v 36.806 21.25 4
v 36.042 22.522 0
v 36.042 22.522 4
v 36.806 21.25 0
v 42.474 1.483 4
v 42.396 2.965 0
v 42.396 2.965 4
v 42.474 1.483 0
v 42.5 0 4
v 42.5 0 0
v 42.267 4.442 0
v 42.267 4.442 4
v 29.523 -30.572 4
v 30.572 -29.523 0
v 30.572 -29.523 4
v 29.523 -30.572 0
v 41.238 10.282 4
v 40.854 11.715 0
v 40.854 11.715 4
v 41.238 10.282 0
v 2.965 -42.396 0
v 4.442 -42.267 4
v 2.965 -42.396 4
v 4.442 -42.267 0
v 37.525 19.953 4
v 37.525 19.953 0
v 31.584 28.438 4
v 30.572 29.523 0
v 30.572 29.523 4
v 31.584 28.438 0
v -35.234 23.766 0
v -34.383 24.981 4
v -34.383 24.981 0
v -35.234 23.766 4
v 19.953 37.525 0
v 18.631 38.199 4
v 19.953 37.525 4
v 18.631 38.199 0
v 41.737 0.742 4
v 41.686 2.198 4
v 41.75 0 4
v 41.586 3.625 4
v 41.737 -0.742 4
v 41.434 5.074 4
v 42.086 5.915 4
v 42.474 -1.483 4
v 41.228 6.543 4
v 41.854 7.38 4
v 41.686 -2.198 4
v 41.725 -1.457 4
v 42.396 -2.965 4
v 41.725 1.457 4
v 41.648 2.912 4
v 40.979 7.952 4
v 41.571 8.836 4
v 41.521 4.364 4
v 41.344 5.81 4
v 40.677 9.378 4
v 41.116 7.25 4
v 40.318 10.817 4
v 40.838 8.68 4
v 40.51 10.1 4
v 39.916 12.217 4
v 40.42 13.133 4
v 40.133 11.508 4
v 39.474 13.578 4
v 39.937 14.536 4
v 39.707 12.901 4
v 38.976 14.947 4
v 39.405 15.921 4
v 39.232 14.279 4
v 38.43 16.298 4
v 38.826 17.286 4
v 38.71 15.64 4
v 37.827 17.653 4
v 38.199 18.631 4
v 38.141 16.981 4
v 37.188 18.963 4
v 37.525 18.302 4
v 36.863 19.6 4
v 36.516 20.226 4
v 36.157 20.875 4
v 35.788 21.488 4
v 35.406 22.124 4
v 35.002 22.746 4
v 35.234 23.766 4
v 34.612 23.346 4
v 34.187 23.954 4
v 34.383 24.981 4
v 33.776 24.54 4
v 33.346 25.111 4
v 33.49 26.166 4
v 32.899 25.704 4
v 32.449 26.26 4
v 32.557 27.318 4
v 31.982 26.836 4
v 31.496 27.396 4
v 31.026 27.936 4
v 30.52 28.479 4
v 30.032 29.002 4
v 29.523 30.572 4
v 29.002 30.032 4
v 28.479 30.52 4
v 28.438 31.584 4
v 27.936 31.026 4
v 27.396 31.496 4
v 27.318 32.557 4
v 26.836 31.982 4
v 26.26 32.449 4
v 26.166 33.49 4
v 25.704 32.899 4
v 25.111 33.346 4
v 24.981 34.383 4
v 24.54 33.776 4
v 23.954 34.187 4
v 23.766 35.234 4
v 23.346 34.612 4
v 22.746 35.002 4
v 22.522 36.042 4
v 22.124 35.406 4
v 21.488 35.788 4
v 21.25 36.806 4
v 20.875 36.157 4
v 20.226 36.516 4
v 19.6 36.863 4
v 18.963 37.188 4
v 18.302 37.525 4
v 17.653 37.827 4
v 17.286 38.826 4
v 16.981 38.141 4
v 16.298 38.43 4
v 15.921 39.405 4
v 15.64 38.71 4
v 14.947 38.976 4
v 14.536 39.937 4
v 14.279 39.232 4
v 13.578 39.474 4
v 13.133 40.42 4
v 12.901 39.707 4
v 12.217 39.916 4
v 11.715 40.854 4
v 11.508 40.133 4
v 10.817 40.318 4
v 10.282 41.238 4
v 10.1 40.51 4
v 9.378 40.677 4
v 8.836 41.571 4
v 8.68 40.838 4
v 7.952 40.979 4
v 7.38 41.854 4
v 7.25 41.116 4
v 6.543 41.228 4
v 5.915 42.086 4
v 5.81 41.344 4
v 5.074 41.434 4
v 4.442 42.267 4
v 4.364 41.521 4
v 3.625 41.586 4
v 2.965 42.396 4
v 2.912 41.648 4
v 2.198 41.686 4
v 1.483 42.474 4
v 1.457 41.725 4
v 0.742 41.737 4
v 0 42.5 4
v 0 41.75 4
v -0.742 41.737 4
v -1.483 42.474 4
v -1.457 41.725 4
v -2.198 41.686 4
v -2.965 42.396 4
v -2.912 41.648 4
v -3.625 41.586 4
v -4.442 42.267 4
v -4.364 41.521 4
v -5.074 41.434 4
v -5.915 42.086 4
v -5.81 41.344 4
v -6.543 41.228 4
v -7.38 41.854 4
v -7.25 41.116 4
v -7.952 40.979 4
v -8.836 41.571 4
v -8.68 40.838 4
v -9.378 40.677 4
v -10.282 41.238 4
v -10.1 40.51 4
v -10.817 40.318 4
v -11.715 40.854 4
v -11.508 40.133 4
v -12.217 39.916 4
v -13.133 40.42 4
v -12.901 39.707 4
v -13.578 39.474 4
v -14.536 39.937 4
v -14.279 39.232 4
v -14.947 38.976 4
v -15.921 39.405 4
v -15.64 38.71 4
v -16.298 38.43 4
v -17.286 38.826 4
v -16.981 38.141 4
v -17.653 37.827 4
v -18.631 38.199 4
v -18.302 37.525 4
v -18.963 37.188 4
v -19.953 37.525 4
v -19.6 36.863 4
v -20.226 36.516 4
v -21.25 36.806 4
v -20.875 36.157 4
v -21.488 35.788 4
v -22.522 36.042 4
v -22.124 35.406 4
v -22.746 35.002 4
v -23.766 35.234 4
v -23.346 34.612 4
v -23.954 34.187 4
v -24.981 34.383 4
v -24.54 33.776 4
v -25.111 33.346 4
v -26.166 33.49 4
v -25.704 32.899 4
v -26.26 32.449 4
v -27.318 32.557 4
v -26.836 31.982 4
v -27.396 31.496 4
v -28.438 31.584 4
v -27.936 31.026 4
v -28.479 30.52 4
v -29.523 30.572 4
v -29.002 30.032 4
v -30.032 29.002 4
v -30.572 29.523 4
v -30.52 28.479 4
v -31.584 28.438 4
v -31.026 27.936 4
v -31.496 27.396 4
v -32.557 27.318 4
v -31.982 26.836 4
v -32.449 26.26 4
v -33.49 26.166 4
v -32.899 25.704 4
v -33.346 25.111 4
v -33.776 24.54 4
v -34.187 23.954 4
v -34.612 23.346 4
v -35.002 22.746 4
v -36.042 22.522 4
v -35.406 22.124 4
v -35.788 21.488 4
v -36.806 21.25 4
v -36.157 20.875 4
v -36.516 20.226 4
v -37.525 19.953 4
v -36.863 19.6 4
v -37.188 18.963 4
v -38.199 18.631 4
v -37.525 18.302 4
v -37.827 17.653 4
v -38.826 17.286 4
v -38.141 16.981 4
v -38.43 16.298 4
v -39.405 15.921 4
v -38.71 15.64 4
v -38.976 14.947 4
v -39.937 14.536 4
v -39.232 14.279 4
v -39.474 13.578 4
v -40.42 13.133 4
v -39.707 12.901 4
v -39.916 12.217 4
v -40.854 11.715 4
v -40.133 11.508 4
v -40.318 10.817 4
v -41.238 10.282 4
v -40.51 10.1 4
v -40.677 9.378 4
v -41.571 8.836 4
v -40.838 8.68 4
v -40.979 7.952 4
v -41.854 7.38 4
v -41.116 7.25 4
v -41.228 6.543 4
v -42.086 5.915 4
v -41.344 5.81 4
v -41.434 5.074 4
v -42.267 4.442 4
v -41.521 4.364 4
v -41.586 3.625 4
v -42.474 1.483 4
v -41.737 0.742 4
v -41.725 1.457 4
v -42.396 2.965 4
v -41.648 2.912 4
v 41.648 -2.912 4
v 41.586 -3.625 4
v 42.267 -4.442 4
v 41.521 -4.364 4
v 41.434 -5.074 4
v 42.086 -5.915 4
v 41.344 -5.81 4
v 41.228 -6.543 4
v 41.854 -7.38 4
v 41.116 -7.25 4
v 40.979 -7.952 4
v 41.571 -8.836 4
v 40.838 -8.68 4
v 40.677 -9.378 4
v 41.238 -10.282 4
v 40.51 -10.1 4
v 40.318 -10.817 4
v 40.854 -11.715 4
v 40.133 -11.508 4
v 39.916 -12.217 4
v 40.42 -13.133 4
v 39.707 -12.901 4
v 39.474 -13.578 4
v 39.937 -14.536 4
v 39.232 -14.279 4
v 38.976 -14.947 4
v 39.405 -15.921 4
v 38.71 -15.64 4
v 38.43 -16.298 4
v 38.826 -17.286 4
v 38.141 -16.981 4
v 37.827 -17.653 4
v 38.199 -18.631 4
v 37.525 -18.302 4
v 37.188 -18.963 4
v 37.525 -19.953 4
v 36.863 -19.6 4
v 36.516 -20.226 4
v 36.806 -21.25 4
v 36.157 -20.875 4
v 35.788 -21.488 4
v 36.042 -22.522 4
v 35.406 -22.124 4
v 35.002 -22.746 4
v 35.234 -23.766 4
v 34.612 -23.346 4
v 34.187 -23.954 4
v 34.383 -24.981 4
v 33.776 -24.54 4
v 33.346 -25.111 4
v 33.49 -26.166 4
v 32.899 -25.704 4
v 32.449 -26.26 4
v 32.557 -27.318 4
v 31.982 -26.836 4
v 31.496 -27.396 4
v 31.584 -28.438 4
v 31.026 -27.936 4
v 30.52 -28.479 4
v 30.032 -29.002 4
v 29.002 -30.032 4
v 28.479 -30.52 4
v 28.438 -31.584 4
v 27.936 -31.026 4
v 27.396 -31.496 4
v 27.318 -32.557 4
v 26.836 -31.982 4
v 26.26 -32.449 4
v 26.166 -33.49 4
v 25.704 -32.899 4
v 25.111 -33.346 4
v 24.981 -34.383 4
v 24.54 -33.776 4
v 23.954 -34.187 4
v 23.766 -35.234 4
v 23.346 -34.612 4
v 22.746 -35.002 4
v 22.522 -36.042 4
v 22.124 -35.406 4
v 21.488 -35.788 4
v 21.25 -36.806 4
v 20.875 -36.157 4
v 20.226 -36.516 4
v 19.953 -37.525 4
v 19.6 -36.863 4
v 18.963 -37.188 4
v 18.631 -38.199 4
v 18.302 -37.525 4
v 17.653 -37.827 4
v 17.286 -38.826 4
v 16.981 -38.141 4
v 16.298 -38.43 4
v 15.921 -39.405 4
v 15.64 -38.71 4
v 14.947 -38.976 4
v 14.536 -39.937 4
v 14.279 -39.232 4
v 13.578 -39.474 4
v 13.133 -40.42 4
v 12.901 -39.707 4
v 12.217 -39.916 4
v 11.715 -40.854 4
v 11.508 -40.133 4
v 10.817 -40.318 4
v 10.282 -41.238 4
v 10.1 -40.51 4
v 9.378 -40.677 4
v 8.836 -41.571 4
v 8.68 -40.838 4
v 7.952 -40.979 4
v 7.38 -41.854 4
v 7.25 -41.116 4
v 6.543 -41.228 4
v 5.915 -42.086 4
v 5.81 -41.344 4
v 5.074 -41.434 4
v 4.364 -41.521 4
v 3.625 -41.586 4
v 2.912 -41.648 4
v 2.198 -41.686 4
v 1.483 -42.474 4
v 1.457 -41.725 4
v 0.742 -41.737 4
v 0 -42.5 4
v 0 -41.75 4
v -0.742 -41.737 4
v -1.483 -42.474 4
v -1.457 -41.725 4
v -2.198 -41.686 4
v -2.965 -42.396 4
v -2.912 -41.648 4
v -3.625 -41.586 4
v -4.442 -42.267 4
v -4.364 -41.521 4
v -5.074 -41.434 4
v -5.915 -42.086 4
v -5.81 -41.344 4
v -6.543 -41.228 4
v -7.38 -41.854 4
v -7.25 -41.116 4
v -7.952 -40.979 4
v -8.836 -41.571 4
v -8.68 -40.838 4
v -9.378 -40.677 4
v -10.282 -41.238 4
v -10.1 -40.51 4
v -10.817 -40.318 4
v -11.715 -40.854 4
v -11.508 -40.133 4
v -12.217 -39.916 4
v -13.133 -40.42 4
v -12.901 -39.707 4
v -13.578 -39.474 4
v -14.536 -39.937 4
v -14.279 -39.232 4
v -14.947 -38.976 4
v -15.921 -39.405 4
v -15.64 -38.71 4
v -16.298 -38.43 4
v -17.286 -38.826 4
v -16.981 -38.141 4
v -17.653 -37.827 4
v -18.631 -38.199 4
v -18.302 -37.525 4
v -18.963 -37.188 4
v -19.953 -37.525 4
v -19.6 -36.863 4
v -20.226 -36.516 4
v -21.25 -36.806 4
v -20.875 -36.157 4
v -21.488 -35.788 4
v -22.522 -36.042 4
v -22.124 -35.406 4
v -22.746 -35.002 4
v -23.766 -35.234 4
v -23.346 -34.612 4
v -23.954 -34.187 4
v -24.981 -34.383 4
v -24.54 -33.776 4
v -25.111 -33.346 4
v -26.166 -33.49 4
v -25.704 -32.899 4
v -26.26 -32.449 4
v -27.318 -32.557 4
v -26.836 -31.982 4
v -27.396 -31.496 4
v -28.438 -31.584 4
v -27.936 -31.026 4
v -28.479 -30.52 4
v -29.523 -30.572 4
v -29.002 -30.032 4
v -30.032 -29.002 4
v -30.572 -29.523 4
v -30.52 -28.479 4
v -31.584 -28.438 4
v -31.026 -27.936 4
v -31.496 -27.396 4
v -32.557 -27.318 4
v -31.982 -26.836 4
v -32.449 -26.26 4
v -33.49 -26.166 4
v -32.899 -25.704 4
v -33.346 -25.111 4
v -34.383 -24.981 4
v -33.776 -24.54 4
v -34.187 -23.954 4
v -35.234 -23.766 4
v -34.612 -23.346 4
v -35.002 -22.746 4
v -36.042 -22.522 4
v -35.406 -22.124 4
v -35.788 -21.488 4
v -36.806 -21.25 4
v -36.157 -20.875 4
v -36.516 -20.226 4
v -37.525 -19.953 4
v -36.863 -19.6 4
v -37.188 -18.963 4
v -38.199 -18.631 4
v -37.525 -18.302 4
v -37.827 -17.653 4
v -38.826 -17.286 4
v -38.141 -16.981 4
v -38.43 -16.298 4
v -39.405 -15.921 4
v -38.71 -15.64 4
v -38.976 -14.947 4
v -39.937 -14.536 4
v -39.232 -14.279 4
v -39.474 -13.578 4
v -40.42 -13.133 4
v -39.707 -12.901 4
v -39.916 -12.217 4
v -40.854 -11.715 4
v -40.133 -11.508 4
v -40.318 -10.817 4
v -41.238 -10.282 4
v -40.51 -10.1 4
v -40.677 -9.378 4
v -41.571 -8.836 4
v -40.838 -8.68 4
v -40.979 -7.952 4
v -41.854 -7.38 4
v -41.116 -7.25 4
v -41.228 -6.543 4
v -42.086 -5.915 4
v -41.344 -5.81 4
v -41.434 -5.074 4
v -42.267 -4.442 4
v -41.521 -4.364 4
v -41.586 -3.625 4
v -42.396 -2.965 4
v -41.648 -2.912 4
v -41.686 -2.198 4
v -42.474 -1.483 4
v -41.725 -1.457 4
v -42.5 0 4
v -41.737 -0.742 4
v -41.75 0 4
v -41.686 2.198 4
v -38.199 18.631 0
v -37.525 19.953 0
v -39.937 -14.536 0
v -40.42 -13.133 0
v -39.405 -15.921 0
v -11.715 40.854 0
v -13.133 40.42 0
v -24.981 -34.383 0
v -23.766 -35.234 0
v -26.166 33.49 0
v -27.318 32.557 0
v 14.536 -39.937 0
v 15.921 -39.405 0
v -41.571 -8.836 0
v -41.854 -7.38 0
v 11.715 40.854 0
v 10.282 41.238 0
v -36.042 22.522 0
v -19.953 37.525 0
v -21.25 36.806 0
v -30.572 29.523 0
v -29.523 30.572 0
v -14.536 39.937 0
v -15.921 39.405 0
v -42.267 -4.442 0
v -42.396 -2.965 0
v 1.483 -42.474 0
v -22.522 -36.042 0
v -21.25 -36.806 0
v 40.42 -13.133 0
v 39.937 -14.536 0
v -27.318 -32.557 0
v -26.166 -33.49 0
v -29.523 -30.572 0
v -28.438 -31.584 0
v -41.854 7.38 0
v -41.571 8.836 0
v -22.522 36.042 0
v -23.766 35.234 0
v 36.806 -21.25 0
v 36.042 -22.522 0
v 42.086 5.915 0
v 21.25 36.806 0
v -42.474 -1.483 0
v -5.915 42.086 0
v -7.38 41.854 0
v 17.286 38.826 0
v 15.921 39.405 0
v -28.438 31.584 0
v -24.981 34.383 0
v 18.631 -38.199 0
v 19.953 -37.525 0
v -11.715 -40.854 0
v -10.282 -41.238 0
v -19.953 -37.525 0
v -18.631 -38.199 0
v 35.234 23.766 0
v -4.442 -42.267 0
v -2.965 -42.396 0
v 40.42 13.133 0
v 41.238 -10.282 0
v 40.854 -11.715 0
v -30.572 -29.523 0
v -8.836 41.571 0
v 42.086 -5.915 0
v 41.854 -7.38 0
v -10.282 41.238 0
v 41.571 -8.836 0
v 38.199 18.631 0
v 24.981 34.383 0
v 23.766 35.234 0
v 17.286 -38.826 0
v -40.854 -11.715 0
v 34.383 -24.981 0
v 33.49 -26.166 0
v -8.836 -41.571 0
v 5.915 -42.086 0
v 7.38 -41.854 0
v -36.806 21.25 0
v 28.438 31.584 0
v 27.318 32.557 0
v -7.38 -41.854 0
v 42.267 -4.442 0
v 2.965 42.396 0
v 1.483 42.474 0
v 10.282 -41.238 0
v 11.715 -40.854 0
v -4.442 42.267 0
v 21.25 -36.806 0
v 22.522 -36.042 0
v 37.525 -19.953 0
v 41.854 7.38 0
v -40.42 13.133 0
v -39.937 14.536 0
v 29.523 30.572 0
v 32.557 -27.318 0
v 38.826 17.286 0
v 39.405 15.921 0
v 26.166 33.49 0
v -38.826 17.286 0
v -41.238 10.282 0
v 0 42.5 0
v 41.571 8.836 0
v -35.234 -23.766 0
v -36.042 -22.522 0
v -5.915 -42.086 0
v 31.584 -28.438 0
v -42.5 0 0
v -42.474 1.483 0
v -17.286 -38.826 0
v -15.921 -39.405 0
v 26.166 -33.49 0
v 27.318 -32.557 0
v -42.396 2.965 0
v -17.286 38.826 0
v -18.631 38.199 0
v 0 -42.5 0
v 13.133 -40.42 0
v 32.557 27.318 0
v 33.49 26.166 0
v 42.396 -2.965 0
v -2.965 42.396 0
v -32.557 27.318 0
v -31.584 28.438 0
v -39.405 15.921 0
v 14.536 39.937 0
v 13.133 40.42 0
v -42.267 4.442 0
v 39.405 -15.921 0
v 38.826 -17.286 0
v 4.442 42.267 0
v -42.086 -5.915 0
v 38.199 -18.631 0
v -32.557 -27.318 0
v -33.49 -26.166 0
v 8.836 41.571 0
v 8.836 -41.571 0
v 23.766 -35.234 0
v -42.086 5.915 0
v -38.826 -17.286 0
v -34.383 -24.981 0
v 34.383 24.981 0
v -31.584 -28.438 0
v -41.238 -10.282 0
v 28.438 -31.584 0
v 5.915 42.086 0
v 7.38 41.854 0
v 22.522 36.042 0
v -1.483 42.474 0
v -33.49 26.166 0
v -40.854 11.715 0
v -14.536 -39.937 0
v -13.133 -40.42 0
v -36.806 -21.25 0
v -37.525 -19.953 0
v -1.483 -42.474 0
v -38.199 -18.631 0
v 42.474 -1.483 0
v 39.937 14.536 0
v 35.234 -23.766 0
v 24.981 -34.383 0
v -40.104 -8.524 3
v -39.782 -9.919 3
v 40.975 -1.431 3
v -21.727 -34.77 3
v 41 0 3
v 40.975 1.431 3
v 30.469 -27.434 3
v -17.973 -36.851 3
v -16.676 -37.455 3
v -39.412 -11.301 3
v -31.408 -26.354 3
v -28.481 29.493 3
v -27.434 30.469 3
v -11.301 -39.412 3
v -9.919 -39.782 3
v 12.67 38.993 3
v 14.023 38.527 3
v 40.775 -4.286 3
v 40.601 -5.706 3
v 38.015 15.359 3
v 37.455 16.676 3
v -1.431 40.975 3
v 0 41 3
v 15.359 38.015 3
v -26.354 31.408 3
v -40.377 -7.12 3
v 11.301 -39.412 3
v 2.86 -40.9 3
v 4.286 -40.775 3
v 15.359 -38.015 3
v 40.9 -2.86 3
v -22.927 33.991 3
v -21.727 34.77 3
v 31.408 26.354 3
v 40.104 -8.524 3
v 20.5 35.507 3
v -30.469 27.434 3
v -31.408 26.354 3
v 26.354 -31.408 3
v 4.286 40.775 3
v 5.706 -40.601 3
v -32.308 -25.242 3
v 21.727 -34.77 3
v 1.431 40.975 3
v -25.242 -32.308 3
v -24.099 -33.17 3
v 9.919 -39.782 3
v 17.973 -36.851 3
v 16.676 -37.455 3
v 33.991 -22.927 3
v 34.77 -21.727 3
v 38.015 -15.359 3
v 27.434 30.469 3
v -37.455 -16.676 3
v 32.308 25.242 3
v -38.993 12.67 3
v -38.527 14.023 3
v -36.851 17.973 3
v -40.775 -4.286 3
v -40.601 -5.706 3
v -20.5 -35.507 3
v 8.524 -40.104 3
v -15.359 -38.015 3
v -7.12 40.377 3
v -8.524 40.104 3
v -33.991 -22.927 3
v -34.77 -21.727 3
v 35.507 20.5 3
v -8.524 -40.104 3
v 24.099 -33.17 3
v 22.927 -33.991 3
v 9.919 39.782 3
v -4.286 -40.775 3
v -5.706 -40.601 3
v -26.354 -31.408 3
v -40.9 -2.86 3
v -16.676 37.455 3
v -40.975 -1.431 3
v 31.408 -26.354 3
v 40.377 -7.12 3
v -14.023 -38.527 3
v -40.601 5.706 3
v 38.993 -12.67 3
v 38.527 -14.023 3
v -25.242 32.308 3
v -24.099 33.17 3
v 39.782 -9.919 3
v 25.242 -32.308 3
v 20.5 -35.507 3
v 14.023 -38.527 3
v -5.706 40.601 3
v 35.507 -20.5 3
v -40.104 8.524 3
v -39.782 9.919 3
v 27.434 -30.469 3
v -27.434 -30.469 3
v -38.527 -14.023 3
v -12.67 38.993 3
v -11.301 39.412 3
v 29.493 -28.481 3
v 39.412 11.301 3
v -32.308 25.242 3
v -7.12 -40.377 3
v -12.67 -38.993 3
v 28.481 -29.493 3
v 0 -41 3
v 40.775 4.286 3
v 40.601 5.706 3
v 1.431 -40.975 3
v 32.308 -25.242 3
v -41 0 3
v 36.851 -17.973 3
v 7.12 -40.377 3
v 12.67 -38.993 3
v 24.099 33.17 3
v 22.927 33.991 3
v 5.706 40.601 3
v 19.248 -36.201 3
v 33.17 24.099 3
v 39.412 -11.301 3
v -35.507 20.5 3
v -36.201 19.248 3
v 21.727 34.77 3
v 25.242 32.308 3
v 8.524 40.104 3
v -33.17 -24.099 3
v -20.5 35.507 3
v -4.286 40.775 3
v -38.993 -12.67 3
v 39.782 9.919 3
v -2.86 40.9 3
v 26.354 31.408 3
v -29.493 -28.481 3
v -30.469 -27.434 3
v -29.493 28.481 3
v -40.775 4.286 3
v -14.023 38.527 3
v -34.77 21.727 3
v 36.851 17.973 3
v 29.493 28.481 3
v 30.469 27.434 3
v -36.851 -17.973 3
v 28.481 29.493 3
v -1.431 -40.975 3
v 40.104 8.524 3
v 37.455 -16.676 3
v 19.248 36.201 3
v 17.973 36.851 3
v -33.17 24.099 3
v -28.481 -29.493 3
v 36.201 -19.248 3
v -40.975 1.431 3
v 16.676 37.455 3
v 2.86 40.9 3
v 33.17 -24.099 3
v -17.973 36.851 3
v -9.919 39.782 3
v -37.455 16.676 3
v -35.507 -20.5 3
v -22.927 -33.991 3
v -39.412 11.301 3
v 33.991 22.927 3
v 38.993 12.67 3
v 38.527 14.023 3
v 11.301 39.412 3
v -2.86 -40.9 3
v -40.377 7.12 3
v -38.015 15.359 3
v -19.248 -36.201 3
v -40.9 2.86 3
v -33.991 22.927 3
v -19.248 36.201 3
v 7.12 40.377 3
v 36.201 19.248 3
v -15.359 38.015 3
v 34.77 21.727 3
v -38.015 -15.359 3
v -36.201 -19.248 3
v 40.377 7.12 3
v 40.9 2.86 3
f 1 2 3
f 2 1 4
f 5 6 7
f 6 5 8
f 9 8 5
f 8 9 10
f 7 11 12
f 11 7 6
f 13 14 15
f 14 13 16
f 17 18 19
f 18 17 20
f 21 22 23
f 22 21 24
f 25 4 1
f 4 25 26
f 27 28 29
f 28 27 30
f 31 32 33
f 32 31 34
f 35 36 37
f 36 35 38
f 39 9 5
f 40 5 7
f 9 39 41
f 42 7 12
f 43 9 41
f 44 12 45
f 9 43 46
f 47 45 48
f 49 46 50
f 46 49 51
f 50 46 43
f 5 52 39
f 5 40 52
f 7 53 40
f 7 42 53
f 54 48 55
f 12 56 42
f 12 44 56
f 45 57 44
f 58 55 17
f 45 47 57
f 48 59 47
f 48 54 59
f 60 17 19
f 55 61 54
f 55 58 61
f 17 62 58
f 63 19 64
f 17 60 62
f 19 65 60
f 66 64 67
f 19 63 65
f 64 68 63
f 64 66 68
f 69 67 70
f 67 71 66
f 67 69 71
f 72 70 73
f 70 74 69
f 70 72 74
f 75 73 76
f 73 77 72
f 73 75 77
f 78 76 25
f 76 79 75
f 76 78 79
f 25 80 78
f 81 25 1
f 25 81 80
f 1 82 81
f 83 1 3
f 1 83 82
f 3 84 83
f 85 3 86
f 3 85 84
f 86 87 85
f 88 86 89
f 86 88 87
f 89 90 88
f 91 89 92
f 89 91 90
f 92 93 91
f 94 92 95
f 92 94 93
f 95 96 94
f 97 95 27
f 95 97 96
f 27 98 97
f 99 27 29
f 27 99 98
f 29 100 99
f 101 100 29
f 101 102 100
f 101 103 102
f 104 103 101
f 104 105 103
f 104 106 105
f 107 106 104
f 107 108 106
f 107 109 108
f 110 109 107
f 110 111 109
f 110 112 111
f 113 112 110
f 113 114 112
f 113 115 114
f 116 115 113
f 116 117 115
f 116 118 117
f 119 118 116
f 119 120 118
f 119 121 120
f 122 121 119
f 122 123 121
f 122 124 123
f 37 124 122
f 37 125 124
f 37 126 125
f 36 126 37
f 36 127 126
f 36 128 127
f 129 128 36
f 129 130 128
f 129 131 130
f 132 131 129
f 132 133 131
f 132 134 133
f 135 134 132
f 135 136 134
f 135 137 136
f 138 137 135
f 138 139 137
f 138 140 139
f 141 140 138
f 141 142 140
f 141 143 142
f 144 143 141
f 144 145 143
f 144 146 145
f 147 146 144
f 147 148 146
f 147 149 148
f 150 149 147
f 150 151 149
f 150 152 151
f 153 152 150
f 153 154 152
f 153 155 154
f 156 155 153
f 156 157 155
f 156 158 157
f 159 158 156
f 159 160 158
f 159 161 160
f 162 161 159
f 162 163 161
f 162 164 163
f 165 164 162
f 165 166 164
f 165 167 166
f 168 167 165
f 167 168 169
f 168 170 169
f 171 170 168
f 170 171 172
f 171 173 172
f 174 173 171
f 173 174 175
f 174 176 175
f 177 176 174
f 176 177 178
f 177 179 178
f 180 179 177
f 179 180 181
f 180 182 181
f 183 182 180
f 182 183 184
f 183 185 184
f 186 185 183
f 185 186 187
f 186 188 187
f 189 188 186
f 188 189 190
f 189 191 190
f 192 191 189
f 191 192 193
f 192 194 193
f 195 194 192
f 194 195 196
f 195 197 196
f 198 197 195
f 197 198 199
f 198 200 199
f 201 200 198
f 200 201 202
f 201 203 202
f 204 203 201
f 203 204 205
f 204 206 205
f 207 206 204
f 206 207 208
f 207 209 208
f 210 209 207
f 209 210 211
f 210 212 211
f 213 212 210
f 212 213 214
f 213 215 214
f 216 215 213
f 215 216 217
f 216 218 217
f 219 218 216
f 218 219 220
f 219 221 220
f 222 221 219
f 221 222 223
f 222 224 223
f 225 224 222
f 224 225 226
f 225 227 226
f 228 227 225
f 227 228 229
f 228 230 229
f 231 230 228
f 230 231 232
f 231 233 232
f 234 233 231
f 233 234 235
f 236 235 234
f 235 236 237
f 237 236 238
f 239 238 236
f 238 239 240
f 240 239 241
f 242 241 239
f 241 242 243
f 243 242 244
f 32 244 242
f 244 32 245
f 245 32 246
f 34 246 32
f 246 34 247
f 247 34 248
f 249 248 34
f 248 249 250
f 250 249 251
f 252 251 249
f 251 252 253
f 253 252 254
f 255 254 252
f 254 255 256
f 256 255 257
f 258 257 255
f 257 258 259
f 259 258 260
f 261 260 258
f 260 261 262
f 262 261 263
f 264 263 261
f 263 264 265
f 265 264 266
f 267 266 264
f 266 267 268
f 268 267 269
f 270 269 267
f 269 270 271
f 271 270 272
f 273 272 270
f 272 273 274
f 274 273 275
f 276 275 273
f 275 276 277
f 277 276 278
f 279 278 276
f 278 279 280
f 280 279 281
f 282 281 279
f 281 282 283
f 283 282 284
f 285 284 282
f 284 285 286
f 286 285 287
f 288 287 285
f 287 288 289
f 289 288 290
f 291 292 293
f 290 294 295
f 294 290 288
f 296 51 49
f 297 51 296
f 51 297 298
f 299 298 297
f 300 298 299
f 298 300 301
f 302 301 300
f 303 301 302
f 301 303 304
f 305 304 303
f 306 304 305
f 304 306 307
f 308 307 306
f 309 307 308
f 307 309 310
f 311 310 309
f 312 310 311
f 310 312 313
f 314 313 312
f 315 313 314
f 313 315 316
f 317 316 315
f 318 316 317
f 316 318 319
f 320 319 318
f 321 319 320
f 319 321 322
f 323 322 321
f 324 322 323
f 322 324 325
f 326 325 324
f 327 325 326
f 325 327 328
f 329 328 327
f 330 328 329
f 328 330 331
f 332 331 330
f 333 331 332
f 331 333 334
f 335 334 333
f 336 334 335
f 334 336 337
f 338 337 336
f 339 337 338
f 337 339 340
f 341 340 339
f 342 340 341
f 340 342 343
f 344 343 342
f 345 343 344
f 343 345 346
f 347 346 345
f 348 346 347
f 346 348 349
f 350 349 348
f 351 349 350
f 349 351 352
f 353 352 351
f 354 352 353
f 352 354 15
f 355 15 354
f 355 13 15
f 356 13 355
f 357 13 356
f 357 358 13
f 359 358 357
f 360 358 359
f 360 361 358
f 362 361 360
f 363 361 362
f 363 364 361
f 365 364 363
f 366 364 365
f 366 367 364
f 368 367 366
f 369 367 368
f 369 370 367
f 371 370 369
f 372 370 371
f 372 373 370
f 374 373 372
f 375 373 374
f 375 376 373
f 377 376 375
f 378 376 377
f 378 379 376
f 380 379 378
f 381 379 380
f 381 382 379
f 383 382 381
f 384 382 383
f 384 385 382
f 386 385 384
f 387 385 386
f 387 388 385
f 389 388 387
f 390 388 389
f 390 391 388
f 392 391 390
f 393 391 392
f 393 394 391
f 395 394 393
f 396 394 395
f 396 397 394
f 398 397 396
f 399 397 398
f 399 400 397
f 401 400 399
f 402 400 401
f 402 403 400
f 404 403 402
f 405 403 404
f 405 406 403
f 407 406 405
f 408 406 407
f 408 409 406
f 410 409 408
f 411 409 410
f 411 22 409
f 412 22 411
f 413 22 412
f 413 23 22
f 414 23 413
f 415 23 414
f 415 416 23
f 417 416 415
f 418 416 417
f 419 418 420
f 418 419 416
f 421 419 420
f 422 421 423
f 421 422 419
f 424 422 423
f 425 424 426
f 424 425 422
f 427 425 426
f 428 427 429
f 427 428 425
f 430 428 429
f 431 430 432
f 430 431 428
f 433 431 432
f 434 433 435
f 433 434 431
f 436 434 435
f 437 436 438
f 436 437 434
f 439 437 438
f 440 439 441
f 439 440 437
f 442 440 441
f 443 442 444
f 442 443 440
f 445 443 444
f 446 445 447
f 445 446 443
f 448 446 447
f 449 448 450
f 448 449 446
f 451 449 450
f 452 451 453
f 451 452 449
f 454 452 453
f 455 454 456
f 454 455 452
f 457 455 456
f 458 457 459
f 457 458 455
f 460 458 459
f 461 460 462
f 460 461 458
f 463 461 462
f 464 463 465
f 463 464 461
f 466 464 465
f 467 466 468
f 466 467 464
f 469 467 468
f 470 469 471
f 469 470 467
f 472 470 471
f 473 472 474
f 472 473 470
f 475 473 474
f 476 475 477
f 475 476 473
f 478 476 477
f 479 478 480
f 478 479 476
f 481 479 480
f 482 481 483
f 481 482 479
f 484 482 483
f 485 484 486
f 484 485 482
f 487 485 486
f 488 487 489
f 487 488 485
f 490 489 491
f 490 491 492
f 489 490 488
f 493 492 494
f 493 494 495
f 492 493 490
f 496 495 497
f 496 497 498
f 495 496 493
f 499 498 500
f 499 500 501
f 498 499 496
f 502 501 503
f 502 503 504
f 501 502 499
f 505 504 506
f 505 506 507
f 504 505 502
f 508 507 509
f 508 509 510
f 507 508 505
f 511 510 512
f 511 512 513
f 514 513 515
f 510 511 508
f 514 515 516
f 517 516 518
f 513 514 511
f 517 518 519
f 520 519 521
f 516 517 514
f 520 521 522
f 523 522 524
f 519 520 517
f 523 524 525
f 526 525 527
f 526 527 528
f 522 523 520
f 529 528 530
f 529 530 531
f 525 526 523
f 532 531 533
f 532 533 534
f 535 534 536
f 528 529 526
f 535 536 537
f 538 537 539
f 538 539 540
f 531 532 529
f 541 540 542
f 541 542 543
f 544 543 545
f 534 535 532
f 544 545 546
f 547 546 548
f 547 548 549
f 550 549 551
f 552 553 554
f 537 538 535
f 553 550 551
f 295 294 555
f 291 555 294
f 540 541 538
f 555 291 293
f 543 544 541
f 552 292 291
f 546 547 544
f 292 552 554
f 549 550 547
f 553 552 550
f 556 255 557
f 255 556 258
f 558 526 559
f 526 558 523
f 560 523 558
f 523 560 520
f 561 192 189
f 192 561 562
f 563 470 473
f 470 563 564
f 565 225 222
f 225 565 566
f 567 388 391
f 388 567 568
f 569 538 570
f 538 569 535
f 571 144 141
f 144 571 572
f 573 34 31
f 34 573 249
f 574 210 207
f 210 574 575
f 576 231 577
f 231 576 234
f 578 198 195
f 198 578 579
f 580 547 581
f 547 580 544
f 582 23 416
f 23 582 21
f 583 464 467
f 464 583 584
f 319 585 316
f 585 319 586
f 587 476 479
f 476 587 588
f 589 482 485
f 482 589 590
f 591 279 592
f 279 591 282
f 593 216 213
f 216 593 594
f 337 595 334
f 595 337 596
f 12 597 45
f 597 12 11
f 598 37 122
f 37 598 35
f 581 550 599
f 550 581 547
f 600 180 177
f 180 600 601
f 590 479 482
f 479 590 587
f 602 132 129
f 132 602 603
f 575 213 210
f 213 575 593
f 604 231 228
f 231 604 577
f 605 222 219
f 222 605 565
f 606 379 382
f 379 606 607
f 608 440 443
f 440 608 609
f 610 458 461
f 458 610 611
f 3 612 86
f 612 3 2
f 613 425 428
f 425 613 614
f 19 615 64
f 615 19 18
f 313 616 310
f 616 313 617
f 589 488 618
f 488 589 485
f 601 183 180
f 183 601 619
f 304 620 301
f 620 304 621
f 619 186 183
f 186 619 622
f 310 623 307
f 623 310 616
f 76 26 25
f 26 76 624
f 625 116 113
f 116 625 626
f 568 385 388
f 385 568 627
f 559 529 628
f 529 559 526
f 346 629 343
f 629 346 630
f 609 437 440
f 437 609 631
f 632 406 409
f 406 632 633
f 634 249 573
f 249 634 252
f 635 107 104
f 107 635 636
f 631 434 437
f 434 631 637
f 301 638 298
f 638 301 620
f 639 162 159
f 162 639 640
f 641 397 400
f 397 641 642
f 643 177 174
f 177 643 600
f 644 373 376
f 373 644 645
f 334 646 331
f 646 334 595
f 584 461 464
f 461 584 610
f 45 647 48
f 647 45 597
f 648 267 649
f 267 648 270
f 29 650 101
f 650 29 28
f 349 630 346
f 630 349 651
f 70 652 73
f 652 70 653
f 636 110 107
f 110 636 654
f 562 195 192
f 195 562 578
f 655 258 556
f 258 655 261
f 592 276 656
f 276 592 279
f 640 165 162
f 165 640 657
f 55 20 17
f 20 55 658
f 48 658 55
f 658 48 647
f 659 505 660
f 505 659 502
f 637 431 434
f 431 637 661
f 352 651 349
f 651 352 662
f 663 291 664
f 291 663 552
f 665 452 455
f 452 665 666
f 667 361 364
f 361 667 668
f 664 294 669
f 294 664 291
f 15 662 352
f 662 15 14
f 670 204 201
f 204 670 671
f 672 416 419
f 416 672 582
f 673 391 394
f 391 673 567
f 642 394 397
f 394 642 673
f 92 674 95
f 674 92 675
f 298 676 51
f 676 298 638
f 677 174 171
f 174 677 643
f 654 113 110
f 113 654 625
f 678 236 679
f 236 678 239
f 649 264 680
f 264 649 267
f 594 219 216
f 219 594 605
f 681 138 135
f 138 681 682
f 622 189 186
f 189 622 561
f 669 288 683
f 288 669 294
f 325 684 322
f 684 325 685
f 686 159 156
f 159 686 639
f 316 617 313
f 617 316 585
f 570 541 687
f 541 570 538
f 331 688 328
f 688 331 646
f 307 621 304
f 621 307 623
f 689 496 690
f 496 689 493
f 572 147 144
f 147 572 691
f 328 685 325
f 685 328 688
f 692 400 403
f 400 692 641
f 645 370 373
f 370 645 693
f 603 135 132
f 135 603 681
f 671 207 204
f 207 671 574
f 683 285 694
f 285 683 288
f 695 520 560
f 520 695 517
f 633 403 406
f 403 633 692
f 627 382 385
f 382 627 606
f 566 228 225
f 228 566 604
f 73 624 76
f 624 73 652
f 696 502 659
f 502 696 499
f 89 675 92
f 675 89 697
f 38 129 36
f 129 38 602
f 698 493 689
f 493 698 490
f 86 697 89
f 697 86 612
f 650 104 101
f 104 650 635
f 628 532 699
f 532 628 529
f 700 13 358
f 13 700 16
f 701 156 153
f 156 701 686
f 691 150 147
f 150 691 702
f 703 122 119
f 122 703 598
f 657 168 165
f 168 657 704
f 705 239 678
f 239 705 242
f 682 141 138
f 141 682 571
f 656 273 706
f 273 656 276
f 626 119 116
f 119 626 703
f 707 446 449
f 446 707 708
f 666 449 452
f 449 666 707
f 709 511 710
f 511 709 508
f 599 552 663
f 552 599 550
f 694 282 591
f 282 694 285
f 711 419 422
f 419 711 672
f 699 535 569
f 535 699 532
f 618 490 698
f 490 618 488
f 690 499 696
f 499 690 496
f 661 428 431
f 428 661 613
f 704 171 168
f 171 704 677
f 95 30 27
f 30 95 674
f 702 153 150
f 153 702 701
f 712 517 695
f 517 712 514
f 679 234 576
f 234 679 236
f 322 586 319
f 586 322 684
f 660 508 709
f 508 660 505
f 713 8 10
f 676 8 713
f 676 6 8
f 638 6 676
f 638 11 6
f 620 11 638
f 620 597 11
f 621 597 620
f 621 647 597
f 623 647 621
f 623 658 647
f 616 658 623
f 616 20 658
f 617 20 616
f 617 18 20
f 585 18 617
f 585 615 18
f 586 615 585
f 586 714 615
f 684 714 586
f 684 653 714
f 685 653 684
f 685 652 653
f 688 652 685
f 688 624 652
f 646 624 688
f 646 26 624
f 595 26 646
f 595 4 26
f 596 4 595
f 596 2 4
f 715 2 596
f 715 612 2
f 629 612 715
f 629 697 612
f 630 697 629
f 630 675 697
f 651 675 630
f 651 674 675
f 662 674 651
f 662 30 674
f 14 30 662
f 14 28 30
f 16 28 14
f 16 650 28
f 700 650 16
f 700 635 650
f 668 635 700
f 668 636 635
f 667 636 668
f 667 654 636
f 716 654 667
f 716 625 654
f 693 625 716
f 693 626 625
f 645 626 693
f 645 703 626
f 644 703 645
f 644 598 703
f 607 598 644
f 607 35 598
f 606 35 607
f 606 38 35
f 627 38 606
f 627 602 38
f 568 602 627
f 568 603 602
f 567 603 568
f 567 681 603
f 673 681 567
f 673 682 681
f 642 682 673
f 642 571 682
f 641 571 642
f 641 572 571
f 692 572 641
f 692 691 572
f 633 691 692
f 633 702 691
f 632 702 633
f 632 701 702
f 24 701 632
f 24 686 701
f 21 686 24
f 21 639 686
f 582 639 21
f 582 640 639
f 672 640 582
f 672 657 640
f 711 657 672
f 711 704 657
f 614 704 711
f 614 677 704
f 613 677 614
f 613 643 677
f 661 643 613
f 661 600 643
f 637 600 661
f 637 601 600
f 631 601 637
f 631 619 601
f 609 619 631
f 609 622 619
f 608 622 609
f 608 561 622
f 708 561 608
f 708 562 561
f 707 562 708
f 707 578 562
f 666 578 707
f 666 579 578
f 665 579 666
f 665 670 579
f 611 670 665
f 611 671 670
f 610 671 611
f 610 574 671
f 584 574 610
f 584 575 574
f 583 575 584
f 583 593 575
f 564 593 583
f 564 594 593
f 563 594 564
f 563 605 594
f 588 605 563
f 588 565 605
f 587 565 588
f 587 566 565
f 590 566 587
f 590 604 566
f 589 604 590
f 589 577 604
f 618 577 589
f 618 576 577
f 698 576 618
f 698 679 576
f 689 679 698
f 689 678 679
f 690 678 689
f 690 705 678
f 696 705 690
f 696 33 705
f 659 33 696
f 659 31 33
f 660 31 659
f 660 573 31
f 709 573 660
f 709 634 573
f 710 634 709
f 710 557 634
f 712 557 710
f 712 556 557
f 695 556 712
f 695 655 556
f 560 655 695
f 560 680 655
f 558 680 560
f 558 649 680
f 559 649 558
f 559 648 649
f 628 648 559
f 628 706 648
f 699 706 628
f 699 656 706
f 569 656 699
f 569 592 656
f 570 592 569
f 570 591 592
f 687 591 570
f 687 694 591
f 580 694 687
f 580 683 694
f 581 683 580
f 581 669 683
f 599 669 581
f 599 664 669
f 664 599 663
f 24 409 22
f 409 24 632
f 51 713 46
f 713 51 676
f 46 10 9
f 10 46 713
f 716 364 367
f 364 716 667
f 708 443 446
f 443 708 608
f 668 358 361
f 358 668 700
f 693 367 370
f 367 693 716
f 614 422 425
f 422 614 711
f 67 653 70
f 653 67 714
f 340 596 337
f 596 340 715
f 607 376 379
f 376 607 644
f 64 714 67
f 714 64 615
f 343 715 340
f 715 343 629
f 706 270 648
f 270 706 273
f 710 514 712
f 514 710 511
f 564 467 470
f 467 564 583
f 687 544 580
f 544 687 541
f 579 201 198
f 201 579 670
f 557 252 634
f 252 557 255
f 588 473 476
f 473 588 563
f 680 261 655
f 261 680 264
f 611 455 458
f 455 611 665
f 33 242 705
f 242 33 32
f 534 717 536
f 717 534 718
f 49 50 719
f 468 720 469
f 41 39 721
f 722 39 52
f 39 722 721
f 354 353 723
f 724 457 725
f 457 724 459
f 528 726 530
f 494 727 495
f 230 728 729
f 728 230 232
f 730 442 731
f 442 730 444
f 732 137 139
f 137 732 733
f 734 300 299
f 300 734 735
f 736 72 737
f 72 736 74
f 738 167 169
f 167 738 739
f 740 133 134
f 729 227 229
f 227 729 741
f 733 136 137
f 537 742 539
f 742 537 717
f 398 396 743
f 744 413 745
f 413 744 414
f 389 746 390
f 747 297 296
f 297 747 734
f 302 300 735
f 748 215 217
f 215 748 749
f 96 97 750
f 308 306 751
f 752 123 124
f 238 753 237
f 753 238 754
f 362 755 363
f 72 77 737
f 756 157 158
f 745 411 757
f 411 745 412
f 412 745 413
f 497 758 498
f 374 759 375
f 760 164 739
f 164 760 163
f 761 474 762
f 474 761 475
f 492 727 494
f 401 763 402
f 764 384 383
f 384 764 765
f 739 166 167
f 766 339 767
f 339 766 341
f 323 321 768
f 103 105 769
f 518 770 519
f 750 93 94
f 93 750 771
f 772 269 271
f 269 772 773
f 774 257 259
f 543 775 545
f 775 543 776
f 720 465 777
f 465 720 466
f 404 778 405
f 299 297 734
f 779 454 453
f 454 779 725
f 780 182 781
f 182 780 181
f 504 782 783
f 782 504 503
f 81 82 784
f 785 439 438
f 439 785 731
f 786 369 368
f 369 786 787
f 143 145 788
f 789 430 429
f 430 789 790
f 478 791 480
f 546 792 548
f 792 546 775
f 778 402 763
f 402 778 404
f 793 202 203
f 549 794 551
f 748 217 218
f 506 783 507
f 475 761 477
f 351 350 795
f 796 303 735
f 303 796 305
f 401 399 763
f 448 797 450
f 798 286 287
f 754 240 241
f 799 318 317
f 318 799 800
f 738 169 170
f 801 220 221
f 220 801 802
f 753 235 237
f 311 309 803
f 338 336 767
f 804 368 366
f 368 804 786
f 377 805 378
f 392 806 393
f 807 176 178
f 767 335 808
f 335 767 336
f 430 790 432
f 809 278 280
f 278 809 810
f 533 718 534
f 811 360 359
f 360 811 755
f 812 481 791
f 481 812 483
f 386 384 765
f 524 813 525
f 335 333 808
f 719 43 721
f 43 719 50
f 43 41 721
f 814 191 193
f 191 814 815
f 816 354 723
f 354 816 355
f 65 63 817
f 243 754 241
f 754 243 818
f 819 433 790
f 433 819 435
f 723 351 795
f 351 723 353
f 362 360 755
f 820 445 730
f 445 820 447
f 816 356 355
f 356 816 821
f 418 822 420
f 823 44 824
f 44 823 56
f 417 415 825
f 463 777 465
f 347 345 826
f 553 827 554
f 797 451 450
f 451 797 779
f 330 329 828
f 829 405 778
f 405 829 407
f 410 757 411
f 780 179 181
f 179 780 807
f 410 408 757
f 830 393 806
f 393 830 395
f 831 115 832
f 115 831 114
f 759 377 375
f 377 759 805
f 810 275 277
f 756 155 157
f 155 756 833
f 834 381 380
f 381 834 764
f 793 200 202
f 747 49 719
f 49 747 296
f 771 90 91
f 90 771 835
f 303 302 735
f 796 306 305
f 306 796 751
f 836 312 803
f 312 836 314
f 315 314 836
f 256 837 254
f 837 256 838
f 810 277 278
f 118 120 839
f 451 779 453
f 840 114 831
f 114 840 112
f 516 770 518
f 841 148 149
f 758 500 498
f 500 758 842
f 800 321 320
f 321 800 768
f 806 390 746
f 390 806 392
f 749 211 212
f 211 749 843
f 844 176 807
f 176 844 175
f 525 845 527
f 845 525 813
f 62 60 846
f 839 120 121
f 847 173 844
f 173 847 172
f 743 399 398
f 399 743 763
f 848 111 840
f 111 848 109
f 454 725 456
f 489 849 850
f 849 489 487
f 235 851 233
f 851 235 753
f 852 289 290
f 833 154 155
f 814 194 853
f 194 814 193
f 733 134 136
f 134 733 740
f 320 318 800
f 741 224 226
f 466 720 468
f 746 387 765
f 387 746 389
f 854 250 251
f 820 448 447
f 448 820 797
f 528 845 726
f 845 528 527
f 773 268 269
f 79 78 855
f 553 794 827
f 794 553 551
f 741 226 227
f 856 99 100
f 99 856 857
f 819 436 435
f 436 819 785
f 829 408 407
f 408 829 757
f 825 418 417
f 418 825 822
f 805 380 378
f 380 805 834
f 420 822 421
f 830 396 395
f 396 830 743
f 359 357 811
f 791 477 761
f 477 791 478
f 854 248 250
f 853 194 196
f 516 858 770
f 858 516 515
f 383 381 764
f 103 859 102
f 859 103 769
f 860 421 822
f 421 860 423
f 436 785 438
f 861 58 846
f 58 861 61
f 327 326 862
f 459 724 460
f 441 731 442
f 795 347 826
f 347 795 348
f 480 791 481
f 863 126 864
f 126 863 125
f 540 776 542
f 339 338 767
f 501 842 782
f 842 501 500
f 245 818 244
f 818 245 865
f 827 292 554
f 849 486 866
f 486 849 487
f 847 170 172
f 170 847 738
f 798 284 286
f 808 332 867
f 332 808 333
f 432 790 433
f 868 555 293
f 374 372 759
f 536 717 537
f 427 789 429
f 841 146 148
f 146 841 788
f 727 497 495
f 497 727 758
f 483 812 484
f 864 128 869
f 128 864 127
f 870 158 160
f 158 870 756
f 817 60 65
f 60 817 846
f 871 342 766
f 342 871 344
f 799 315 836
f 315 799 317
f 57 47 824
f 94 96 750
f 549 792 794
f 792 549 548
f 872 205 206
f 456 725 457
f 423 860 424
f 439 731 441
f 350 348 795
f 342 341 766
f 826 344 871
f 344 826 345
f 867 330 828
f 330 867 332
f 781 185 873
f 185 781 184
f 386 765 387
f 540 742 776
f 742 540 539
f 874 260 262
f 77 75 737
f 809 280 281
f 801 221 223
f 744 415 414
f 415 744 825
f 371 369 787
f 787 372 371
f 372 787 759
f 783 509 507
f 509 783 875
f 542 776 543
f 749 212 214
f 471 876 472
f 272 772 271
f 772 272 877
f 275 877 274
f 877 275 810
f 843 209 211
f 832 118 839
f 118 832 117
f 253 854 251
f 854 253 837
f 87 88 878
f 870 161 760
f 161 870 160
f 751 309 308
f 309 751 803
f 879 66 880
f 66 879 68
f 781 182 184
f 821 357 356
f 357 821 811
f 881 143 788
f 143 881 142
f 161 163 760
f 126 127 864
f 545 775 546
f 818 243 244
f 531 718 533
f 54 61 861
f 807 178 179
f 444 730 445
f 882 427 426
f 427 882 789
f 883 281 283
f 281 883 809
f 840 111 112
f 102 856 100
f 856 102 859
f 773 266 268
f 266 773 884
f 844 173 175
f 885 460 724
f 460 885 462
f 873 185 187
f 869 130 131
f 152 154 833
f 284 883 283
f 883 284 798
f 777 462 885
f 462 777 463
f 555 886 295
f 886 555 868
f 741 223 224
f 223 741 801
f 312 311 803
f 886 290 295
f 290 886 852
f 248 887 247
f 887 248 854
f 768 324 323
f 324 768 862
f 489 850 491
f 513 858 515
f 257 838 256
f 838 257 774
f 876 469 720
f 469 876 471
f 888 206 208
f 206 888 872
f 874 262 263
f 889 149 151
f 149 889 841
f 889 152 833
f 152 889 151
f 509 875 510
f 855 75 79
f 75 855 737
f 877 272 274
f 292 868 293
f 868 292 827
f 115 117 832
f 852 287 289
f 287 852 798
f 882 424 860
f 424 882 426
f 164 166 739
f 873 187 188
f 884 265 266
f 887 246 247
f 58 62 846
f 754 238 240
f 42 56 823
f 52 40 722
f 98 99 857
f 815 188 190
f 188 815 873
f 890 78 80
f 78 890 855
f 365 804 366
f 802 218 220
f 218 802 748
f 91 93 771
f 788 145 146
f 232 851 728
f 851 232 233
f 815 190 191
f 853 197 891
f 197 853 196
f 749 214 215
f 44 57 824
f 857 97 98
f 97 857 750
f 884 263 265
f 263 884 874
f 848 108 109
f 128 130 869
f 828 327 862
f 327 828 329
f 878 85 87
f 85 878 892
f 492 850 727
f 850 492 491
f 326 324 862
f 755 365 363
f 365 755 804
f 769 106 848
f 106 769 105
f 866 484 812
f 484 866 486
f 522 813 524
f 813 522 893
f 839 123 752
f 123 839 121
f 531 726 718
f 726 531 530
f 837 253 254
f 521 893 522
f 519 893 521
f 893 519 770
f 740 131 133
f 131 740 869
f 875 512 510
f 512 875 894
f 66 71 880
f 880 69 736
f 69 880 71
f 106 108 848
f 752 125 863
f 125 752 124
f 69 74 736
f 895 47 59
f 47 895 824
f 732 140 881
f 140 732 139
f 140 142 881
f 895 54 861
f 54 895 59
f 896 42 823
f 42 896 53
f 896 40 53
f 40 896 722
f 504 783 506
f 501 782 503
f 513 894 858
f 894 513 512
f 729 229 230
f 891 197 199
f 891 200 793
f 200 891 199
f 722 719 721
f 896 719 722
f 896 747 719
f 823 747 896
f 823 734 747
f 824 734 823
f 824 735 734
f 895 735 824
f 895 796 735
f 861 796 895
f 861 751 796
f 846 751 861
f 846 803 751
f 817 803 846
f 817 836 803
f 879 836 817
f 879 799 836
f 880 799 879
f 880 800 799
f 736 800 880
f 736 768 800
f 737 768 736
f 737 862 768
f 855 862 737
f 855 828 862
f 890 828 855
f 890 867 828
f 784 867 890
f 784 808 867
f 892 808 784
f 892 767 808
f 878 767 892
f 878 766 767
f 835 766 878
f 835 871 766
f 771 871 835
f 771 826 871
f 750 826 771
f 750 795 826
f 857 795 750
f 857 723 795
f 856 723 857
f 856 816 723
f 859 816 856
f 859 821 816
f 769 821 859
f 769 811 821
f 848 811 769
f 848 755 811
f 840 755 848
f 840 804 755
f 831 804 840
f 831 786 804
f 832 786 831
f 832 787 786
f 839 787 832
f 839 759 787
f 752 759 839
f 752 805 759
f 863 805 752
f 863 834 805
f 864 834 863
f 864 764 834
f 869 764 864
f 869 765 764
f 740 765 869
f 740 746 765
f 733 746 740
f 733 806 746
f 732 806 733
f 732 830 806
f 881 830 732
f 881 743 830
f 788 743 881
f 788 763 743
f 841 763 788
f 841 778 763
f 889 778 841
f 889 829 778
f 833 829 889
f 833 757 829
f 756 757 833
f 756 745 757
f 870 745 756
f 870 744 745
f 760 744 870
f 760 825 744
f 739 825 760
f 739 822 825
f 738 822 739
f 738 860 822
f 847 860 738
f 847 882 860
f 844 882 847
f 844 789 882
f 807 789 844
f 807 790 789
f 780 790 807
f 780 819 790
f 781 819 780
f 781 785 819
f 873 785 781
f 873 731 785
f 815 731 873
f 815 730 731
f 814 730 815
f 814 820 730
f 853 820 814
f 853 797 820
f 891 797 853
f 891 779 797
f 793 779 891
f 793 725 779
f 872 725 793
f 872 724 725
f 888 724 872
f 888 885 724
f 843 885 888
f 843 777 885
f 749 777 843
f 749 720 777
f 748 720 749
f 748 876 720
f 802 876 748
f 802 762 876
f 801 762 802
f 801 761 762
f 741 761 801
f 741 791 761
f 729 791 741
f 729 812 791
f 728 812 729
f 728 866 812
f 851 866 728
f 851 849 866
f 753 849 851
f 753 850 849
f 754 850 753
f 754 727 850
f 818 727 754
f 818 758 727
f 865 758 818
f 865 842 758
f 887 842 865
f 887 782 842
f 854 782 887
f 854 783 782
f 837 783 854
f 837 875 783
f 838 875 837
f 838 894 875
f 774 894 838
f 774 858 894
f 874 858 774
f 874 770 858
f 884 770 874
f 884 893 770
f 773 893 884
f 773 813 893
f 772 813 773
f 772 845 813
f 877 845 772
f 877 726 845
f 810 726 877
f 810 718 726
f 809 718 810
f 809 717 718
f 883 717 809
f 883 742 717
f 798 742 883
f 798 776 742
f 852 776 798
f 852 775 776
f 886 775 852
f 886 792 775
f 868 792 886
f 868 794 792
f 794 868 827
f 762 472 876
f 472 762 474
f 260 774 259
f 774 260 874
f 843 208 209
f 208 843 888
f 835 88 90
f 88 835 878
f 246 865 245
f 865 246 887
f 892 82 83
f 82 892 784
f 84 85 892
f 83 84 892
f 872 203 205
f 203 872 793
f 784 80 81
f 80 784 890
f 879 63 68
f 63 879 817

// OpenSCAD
$fa=2;
$fs=.05;

difference() {
    cylinder(h=4, d=85);
    translate([0, 0, 3]) cylinder(h=2, d=82, d2=85);

    translate([0, 0, -24])
    scale([.7, .7, .5]) surface("hazard.png", center=true);
}
